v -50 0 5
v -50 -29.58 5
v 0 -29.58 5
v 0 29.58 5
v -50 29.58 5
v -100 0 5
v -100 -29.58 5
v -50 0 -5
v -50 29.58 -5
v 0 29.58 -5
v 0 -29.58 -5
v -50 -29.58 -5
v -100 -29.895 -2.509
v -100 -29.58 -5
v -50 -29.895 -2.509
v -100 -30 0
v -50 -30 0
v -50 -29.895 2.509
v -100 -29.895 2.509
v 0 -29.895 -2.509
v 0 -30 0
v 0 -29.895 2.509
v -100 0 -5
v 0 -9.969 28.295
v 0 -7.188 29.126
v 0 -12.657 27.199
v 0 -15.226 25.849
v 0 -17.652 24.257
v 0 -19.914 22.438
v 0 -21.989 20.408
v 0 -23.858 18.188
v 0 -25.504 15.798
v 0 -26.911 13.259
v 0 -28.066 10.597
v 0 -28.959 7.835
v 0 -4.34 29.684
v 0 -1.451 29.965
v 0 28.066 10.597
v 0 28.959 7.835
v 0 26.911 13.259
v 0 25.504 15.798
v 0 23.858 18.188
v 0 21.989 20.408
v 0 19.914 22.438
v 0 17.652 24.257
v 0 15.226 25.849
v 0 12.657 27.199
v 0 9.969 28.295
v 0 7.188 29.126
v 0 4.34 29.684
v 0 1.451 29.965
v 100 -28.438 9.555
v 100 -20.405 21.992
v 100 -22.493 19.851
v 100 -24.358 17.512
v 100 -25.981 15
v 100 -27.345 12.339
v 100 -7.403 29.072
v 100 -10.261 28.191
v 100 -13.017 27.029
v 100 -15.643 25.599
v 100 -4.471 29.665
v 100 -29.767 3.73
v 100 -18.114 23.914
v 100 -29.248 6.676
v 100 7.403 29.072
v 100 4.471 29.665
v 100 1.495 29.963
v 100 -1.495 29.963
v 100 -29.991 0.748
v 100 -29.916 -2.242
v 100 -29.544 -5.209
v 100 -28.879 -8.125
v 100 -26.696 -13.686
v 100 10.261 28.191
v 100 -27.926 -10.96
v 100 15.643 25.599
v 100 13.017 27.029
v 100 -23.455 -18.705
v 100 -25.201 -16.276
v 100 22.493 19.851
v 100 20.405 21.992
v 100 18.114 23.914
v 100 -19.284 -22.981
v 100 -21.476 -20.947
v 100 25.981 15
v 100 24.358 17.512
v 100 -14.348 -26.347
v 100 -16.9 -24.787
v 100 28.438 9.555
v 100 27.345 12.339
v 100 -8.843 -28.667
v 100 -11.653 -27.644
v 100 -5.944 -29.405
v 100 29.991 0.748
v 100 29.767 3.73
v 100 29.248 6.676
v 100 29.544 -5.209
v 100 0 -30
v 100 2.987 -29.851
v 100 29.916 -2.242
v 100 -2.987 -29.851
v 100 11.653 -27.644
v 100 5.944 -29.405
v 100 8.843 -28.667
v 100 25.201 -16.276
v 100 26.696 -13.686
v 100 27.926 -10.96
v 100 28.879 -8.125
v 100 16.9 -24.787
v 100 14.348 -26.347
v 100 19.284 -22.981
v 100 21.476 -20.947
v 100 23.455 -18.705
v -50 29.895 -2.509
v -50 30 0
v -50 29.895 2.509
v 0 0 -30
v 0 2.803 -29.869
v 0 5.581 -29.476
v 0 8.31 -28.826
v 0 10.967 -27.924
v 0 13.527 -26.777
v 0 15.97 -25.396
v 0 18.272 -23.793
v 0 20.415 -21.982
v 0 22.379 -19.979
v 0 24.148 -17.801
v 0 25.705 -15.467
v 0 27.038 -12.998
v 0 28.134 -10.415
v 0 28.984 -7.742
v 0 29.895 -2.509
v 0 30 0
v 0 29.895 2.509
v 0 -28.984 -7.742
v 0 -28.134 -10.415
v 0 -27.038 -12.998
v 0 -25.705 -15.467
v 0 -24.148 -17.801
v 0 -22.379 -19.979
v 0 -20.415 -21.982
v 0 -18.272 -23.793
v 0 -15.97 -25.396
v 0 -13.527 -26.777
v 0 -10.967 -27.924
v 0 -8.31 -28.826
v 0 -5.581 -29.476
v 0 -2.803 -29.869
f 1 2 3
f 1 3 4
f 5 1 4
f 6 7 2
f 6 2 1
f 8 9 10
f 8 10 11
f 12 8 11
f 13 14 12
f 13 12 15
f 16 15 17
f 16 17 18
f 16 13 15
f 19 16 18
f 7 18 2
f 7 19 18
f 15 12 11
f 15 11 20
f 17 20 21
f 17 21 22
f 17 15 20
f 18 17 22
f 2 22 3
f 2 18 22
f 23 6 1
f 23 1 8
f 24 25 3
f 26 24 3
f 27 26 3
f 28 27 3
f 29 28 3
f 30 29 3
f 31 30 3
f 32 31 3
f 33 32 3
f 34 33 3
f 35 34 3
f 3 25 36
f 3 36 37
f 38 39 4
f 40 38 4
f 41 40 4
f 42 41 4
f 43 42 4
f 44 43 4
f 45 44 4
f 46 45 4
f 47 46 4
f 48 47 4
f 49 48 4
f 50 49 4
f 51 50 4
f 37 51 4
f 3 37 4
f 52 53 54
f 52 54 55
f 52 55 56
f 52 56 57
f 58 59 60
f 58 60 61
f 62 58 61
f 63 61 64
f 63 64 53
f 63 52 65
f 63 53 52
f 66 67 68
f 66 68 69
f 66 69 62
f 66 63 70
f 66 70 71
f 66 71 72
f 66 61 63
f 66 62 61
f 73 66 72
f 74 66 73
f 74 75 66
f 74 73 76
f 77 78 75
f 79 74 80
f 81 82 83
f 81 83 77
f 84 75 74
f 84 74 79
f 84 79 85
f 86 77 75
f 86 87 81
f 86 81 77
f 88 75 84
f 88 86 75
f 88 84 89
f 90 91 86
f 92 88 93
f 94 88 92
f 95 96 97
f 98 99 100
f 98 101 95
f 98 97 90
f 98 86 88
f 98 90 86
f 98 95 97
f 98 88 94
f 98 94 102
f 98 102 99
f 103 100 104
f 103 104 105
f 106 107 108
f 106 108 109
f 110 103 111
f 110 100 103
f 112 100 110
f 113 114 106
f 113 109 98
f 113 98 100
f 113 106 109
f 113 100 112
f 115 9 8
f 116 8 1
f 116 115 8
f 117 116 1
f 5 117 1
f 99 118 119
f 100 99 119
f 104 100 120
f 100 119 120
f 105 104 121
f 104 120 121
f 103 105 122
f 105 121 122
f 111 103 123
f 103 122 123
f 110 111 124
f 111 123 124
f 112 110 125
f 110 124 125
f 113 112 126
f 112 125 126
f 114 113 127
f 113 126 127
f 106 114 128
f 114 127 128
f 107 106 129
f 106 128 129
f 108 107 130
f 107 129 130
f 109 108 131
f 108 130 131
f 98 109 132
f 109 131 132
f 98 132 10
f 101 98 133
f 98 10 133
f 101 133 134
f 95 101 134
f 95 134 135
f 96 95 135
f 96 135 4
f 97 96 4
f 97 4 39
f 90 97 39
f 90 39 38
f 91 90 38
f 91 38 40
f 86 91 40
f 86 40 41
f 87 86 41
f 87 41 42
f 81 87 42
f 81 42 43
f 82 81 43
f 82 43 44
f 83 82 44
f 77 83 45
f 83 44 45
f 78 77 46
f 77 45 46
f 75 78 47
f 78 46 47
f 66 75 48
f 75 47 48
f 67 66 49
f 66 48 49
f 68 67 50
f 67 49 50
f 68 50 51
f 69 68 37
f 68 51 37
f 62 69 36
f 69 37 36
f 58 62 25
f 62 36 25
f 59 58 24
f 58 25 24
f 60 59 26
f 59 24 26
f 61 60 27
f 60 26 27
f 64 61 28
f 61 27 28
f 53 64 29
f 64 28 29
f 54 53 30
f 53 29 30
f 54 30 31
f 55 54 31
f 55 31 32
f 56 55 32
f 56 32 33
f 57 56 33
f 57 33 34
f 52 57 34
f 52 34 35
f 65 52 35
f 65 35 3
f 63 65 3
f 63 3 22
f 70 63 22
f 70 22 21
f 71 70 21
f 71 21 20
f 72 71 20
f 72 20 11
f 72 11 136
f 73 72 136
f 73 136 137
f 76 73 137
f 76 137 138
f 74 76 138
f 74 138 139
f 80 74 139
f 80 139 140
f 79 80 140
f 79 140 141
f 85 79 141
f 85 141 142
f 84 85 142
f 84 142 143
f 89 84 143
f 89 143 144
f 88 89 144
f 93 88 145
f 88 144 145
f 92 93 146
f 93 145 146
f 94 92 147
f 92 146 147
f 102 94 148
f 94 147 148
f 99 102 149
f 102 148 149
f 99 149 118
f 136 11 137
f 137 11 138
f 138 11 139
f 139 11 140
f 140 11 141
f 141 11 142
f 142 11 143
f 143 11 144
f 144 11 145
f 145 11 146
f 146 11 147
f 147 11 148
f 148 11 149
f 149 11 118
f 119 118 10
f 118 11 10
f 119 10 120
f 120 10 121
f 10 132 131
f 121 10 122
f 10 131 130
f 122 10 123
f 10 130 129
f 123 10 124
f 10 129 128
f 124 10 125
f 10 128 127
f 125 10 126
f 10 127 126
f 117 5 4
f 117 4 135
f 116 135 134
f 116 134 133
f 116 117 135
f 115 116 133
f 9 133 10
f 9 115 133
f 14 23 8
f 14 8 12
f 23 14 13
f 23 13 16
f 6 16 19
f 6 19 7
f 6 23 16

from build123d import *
from build123d.topology import SkipClean

# Parameters (mm, degrees)
SKETCH1_R           = 30
BOSS_EXTRUDE1_DEPTH = 100
BOSS_EXTRUDE2_START = 50
BOSS_EXTRUDE2_DEPTH = 50
BOSS_EXTRUDE3_START = 50
BOSS_EXTRUDE3_DEPTH = 50


with BuildPart() as part:
    # Sketch1 → Boss-Extrude1 (new body)
    with BuildSketch(Plane(origin=(0, 0, 0), x_dir=(0, 0, -1), z_dir=(1, 0, 0))):
        Circle(SKETCH1_R)
    extrude(amount=BOSS_EXTRUDE1_DEPTH)

    # Sketch2 → Boss-Extrude2 (add)
    with SkipClean():  # the faces are left unmerged after this step: merging them gives an invalid solid
        with BuildSketch(Plane.ZY.offset(BOSS_EXTRUDE2_START)):
            with BuildLine():
                Line((5, -29.580398915), (5, 29.580398915))
                ThreePointArc((5, 29.580398915), (0, 30), (-5, 29.580398915))
                Line((-5, 29.580398915), (-5, -29.580398915))
                ThreePointArc((-5, -29.580398915), (0, -30), (5, -29.580398915))
            make_face()
        extrude(amount=-BOSS_EXTRUDE2_DEPTH)

    # Sketch3 → Boss-Extrude3 (add)
    with SkipClean():  # the faces are left unmerged after this step: merging them gives an invalid solid
        with BuildSketch(Plane.ZY.offset(50).offset(BOSS_EXTRUDE3_START)):
            with BuildLine():
                Line((5, 0), (-5, 0))
                Line((-5, 0), (-5, -29.580398915))
                ThreePointArc((-5, -29.580398915), (0, -30), (5, -29.580398915))
                Line((5, -29.580398915), (5, 0))
            make_face()
        extrude(amount=-BOSS_EXTRUDE3_DEPTH)


solid = part.part
